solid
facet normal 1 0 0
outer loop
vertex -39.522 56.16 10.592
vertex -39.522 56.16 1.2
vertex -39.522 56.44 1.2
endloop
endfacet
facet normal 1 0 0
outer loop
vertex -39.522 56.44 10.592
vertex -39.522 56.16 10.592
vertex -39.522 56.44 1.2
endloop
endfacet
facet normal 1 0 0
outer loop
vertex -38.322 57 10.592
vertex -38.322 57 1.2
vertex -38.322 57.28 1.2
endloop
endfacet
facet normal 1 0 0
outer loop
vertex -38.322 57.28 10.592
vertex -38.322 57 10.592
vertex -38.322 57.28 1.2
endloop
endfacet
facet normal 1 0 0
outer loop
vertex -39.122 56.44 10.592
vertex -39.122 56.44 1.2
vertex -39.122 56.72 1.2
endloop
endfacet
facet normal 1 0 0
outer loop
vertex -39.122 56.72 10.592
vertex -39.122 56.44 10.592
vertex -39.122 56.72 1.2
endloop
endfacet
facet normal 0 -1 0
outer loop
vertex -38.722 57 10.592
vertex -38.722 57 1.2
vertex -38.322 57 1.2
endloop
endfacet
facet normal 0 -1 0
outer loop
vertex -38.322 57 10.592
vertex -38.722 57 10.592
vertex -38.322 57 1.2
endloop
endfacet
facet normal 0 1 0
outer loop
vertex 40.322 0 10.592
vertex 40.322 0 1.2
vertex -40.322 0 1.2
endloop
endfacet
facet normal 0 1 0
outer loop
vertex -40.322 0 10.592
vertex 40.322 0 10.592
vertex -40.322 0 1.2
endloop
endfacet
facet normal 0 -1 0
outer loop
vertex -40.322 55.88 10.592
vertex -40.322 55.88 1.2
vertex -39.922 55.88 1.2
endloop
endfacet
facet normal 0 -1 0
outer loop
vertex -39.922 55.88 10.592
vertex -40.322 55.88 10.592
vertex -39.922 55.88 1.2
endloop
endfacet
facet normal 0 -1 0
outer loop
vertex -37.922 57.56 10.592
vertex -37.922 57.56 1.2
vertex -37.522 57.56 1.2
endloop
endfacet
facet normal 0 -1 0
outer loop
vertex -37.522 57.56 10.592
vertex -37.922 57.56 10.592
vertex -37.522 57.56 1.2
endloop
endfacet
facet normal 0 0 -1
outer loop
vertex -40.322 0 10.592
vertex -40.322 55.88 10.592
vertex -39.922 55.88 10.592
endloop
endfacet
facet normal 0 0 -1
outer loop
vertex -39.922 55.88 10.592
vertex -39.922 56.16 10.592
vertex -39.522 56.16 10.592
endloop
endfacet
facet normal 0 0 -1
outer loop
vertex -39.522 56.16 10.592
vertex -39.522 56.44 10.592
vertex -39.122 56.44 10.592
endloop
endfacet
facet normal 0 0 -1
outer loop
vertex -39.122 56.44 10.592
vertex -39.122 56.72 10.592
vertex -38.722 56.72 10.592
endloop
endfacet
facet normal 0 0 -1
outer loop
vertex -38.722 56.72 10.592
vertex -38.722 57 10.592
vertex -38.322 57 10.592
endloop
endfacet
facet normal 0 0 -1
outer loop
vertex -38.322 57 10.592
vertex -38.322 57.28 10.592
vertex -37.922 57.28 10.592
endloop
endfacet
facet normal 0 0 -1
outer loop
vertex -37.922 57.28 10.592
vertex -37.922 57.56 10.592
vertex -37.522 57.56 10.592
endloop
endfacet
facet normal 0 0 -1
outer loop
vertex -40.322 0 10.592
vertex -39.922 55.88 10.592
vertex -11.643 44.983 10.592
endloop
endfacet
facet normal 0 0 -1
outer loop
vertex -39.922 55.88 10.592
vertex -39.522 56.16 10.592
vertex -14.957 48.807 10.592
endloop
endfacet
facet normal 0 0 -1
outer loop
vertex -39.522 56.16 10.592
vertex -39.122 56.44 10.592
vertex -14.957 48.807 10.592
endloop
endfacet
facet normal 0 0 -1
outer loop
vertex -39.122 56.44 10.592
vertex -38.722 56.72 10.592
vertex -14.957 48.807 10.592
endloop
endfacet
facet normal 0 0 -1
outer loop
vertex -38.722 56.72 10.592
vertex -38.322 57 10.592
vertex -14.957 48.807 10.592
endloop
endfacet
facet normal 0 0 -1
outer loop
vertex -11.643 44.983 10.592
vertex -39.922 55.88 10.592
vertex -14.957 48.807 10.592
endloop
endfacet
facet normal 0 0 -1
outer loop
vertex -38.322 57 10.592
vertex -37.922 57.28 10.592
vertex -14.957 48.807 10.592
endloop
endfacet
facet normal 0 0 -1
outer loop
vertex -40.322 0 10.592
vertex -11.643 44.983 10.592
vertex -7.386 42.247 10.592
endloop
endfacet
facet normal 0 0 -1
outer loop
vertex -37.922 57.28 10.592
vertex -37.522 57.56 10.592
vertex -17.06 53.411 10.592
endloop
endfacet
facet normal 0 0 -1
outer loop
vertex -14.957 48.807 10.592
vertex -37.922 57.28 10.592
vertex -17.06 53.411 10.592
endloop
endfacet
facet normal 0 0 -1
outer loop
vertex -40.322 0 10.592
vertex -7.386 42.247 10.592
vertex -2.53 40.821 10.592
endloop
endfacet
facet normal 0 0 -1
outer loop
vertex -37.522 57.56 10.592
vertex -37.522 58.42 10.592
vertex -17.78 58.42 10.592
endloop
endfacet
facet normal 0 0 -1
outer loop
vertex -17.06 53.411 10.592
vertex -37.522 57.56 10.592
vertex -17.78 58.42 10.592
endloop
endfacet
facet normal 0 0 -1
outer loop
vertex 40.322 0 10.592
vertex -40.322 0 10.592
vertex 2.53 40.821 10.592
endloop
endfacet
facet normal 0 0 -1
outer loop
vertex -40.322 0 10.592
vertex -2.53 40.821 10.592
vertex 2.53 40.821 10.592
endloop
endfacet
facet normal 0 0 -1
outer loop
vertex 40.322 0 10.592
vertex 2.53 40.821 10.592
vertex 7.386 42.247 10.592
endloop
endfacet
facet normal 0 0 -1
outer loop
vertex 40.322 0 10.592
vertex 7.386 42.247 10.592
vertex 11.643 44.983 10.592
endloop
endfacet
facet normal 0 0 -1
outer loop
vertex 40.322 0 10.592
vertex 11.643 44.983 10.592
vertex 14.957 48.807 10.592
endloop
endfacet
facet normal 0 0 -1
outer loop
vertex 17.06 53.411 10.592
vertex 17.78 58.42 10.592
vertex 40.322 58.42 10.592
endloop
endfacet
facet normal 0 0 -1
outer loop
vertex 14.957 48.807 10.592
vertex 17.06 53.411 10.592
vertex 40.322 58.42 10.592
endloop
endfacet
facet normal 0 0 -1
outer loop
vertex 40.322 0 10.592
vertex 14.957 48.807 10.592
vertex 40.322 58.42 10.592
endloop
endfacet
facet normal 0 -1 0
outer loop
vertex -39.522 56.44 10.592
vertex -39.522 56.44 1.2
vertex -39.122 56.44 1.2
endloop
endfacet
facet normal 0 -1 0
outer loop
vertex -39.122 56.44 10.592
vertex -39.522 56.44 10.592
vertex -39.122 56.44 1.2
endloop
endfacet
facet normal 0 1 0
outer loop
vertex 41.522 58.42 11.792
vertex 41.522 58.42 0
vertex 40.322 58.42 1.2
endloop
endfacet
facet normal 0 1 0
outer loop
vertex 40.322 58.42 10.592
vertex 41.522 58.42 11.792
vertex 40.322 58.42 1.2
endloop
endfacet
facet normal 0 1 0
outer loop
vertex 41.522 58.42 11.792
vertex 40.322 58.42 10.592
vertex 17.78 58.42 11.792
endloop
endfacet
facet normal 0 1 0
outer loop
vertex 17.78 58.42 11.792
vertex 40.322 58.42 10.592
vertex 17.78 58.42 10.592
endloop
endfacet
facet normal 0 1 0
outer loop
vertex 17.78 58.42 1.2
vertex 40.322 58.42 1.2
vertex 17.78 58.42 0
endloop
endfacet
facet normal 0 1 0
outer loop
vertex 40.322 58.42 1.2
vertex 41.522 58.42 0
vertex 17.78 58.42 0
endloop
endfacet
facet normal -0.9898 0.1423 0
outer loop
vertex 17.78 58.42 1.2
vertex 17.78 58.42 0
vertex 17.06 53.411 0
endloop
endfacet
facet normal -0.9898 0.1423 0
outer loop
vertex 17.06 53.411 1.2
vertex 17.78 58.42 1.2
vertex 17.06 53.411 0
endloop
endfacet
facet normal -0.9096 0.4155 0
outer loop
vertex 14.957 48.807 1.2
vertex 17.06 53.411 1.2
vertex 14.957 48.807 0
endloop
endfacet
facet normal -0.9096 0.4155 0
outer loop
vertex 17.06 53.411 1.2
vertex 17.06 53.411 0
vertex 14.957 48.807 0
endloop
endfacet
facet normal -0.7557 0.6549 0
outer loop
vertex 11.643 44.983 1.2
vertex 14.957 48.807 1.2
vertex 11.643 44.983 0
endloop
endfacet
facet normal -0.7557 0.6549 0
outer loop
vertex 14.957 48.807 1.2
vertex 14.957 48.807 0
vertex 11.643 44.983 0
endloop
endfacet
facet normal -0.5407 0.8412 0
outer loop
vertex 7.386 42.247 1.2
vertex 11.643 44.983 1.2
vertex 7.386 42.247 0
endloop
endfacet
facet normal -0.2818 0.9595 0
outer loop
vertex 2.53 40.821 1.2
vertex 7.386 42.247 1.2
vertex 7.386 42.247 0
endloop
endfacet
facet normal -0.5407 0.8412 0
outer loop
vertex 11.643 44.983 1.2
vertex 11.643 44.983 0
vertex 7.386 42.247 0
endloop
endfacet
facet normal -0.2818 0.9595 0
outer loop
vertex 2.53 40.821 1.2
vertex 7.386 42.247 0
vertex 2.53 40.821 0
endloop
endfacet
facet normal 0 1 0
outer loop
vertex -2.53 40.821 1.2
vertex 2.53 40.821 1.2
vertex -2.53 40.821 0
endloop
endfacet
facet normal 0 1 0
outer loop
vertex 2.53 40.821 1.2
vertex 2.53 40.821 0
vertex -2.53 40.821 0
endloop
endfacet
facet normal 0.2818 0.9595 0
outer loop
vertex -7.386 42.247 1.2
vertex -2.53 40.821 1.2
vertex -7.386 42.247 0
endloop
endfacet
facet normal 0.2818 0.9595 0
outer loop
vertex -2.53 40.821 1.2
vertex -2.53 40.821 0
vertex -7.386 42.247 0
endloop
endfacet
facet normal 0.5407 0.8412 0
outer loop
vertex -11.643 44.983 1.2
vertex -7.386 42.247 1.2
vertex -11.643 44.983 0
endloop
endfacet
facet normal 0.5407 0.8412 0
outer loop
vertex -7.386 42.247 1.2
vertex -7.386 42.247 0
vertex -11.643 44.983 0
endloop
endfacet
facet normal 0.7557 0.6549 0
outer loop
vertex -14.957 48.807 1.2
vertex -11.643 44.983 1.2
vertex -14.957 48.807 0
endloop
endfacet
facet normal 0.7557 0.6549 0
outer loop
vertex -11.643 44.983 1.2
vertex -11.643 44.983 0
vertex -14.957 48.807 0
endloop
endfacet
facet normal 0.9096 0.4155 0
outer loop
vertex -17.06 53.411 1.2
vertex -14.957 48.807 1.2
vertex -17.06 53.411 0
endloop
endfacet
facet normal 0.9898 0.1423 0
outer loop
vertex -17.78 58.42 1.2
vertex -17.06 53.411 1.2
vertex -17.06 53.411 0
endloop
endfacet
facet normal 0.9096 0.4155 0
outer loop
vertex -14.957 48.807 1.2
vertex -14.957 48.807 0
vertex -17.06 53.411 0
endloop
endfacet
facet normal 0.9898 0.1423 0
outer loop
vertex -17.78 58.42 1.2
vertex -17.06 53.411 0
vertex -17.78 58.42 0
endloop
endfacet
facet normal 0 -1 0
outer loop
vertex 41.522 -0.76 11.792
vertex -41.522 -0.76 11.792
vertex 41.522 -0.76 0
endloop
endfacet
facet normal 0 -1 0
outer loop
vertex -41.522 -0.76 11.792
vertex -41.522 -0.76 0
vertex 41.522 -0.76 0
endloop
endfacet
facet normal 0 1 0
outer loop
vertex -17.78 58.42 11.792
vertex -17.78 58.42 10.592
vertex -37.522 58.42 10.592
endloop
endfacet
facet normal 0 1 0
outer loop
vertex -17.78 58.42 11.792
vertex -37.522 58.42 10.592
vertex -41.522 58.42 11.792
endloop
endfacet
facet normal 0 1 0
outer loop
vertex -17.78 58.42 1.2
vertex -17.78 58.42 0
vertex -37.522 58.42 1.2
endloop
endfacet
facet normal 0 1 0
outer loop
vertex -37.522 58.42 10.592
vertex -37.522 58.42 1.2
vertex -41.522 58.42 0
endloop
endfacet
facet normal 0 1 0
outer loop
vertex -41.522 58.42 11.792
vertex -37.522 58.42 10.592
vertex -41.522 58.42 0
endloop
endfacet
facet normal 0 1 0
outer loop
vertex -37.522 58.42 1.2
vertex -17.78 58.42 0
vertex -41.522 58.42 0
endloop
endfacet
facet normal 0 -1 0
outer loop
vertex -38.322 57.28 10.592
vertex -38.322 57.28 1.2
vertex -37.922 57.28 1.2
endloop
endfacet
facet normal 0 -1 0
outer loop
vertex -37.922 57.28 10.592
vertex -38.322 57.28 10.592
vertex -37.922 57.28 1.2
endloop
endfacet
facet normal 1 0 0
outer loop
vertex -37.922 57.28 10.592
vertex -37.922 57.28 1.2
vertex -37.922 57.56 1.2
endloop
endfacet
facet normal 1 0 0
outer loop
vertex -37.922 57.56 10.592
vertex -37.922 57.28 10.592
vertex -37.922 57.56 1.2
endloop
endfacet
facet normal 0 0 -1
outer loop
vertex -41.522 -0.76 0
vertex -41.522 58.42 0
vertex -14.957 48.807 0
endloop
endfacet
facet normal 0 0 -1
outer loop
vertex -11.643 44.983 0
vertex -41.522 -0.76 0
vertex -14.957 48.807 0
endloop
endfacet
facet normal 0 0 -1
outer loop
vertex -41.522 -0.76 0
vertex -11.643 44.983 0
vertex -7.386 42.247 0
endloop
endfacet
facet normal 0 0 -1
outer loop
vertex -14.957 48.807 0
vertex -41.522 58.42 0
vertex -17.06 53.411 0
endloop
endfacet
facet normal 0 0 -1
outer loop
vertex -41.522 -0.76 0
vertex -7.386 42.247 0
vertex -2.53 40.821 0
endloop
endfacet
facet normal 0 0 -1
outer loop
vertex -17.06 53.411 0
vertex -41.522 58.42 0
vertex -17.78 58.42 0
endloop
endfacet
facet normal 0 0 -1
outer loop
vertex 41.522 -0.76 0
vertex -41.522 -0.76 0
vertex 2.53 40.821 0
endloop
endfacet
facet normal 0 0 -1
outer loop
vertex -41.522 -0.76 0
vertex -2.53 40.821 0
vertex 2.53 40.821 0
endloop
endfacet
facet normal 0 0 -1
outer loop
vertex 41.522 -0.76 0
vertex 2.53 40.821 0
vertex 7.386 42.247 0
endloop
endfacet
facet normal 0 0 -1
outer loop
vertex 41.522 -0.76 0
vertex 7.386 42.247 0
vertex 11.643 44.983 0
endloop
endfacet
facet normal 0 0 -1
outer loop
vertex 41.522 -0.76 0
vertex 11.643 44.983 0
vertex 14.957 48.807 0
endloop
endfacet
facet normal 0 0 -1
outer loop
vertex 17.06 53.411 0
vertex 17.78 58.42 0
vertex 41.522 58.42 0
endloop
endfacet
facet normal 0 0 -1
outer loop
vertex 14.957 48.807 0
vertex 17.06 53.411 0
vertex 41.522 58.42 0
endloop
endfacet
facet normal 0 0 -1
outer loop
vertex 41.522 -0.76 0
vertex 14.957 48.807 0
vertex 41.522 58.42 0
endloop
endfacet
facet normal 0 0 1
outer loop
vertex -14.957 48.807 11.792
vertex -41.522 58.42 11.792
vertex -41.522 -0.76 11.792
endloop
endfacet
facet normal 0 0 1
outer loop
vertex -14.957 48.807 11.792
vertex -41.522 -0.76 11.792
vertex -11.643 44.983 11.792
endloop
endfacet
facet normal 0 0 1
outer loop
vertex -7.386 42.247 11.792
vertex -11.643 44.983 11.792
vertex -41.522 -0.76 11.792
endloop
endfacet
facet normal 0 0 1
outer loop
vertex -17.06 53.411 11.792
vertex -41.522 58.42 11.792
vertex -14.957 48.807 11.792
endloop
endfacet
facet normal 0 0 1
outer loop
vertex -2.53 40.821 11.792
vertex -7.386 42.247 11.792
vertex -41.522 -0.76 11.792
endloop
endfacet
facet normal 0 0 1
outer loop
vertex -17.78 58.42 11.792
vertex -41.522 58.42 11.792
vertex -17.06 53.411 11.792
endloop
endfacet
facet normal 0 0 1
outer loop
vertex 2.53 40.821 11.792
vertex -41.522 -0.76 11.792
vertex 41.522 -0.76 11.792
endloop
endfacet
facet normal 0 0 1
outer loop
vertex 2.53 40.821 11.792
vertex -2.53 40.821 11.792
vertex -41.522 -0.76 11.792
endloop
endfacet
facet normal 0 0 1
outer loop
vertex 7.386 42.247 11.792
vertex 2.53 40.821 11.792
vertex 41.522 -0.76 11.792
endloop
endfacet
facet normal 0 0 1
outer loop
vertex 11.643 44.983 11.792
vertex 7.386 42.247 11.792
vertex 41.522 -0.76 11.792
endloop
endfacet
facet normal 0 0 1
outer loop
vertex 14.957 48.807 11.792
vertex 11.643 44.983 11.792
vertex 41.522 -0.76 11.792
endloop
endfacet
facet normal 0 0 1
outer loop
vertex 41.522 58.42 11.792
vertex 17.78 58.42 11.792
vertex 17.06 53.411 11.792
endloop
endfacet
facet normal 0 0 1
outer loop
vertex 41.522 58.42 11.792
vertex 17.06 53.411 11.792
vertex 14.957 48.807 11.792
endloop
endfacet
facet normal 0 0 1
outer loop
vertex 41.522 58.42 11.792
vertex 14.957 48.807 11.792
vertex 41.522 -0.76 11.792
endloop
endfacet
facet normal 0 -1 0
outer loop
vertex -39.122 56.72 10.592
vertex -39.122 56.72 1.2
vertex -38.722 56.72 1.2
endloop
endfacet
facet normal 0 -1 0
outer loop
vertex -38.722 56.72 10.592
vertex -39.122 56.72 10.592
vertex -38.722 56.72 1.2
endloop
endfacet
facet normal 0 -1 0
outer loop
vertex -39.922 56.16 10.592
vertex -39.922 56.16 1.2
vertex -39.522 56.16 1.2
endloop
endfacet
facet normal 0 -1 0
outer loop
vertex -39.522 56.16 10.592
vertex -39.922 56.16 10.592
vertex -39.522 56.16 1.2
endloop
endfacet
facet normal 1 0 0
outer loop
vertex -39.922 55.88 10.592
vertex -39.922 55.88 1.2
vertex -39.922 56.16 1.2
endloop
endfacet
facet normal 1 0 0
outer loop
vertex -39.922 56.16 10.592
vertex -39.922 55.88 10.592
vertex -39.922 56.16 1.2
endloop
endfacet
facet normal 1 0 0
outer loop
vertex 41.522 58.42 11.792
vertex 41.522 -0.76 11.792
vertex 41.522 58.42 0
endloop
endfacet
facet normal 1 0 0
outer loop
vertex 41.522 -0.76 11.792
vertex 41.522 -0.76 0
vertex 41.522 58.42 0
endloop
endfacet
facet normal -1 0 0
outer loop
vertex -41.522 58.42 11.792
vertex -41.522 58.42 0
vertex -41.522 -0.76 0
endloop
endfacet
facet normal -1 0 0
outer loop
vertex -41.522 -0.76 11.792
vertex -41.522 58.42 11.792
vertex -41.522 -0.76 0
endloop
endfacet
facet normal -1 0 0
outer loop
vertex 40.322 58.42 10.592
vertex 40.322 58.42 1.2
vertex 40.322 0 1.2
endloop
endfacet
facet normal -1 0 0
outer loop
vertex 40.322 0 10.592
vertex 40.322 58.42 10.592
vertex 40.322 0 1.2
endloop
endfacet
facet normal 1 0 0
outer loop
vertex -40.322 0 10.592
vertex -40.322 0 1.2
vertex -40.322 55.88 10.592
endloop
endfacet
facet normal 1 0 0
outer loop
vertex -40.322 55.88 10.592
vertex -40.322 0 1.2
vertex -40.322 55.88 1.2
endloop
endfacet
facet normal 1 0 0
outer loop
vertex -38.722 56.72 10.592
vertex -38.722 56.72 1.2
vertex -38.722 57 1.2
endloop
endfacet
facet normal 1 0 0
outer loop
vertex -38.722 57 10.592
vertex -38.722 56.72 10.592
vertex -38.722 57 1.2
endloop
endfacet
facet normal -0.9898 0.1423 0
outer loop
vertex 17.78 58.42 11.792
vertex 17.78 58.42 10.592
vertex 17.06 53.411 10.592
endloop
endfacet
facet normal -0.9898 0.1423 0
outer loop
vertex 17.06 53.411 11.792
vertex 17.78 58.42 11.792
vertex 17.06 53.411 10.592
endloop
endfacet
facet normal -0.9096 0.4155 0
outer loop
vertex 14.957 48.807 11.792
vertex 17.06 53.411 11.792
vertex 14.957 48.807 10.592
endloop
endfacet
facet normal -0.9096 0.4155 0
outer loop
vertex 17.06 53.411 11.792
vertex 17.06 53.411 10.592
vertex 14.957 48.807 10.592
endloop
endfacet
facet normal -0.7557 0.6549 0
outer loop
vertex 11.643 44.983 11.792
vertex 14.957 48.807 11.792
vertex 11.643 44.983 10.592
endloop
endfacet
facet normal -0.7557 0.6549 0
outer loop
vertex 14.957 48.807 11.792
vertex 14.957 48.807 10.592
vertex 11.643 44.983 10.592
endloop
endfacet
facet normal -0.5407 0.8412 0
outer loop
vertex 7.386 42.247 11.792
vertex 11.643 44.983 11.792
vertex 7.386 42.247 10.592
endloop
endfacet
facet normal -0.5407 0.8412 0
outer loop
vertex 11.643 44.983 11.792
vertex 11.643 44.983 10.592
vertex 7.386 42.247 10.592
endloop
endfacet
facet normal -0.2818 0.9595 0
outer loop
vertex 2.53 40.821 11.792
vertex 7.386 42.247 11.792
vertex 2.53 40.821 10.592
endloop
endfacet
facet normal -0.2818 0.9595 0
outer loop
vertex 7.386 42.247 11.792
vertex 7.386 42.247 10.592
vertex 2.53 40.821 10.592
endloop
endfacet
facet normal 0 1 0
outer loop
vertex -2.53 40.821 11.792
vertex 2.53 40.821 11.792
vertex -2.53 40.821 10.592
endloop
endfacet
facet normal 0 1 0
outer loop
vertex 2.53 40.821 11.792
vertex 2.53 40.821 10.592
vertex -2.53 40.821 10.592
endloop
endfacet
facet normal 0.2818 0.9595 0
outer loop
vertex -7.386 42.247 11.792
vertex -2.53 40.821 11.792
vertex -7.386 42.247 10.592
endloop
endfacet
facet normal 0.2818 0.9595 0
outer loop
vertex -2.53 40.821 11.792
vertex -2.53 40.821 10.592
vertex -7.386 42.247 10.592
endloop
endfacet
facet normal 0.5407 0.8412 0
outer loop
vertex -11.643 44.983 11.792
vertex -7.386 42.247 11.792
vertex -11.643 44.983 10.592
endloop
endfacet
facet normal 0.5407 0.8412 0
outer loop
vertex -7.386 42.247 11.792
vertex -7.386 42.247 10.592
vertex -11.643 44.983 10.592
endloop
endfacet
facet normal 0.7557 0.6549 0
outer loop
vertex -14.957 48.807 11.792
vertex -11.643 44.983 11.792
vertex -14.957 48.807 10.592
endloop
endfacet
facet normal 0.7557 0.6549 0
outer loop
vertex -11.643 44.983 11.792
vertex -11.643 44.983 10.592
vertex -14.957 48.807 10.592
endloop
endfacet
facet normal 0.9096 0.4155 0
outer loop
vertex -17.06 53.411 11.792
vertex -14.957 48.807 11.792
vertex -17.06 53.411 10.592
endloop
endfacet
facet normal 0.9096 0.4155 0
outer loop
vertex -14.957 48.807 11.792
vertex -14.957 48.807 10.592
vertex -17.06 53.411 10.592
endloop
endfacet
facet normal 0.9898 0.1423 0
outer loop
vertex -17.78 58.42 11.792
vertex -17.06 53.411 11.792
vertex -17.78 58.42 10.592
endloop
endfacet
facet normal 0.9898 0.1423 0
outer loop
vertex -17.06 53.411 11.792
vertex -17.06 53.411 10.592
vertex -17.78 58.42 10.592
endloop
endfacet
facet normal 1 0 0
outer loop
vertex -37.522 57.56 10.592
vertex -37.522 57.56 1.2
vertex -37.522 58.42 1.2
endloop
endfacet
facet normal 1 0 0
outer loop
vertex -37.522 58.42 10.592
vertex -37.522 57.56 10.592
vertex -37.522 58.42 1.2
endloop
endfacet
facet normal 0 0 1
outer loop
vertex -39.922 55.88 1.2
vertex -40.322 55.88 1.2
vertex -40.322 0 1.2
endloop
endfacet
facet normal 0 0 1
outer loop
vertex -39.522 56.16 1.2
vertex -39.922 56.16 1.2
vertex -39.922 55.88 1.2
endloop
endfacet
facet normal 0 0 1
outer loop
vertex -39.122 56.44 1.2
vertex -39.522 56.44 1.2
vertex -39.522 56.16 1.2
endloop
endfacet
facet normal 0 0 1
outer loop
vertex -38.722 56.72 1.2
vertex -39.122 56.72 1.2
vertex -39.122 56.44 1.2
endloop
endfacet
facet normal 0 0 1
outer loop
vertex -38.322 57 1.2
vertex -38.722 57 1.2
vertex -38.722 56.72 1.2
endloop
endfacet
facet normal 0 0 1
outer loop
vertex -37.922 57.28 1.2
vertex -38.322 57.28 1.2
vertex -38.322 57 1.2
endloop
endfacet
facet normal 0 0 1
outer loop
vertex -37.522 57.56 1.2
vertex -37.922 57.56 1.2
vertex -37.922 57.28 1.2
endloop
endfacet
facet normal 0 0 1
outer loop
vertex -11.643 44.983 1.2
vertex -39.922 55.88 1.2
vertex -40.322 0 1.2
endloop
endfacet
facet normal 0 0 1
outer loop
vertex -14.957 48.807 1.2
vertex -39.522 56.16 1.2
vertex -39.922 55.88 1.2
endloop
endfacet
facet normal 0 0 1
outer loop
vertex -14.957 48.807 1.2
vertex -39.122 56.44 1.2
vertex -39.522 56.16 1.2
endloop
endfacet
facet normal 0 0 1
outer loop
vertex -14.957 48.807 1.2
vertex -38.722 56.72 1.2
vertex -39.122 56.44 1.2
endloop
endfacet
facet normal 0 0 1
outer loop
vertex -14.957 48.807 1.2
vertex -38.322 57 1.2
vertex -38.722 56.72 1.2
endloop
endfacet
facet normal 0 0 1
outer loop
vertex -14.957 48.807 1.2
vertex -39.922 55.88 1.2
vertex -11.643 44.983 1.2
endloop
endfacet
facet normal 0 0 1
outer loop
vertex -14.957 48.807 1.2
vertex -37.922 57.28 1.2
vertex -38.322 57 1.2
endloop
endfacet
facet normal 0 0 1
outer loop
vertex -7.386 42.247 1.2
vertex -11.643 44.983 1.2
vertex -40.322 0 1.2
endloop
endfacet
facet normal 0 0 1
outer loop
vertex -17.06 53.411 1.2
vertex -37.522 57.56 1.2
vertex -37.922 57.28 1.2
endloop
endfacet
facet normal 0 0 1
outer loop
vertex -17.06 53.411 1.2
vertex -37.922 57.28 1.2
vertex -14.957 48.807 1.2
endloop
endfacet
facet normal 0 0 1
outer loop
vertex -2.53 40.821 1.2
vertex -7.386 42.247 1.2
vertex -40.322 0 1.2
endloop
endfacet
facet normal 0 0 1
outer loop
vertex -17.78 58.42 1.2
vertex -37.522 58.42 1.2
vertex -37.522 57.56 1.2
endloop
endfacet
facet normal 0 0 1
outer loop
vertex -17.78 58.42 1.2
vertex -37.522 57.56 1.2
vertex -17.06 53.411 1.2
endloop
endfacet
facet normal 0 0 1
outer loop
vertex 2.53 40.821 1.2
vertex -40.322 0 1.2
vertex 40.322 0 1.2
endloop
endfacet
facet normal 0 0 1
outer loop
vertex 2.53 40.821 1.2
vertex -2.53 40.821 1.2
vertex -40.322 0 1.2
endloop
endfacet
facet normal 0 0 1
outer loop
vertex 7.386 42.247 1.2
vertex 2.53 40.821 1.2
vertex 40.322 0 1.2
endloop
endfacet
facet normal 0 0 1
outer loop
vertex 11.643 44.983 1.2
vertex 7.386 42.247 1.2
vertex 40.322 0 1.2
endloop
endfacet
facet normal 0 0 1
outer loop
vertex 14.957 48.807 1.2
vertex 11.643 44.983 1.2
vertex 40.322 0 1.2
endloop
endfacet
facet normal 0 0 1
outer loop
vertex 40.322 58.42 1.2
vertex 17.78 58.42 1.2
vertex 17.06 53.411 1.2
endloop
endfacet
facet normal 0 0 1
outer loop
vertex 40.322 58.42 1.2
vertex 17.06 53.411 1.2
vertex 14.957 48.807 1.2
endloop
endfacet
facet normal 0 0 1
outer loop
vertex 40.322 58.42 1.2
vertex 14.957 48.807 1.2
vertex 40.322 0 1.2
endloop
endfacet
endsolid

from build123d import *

# Parameters (mm, degrees)
F1_DEPTH = 1.2
F2_DEPTH = 10.5918
F4_DEPTH = 1.2
F6_DEPTH = 9.3918


with BuildPart() as f1:
    # F0 (on Top) → F1 (new body)
    with BuildSketch(Plane.XY):
        with BuildLine():
            Line((-17.78, 58.42), (-40.3225, 58.42))
            Line((-40.3225, 58.42), (-40.3225, 0))
            Line((-40.3225, 0), (40.3225, 0))
            Line((40.3225, 0), (40.3225, 58.42))
            Line((40.3225, 58.42), (17.78, 58.42))
            ThreePointArc((17.78, 58.42), (0, 40.64), (-17.78, 58.42))
        make_face()
        Polygon((-40.3225, 0), (-40.3225, 58.42), (-41.5225, 58.42), (-41.5225, -0.76), (41.5225, -0.76), (41.5225, 58.42), (40.3225, 58.42), (40.3225, 0), align=None)
    extrude(amount=F1_DEPTH)

    # F0 (on Top) → F2 (join)
    with BuildSketch(Plane.XY):
        Polygon((-40.3225, 0), (-40.3225, 58.42), (-41.5225, 58.42), (-41.5225, -0.76), (41.5225, -0.76), (41.5225, 58.42), (40.3225, 58.42), (40.3225, 0), align=None)
    extrude(amount=F2_DEPTH)

    # F3 (on face) → F4 (join)
    with BuildSketch(Plane.XY.offset(10.5918)):
        with BuildLine():
            Line((-40.3225, 58.42), (-41.5225, 58.42))
            Line((-41.5225, 58.42), (-41.5225, -0.76))
            Line((-41.5225, -0.76), (41.5225, -0.76))
            Line((41.5225, -0.76), (41.5225, 58.42))
            Line((41.5225, 58.42), (40.3225, 58.42))
            Line((40.3225, 58.42), (17.78, 58.42))
            ThreePointArc((17.78, 58.42), (0, 40.64), (-17.78, 58.42))
            Line((-17.78, 58.42), (-40.3225, 58.42))
        make_face()
    extrude(amount=F4_DEPTH)

    # F5 (on face) → F6 (join, through all)
    with BuildSketch(Plane.XY.offset(1.2)):
        Polygon((-40.3225, 55.88), (-39.9225, 55.88), (-39.9225, 56.16), (-39.5225, 56.16), (-39.5225, 56.44), (-39.1225, 56.44), (-39.1225, 56.72), (-38.7225, 56.72), (-38.7225, 57), (-38.3225, 57), (-38.3225, 57.28), (-37.9225, 57.28), (-37.9225, 57.56), (-37.5225, 57.56), (-37.5225, 58.42), (-40.3225, 58.42), align=None)
    extrude(amount=F6_DEPTH)


solid = f1.part
